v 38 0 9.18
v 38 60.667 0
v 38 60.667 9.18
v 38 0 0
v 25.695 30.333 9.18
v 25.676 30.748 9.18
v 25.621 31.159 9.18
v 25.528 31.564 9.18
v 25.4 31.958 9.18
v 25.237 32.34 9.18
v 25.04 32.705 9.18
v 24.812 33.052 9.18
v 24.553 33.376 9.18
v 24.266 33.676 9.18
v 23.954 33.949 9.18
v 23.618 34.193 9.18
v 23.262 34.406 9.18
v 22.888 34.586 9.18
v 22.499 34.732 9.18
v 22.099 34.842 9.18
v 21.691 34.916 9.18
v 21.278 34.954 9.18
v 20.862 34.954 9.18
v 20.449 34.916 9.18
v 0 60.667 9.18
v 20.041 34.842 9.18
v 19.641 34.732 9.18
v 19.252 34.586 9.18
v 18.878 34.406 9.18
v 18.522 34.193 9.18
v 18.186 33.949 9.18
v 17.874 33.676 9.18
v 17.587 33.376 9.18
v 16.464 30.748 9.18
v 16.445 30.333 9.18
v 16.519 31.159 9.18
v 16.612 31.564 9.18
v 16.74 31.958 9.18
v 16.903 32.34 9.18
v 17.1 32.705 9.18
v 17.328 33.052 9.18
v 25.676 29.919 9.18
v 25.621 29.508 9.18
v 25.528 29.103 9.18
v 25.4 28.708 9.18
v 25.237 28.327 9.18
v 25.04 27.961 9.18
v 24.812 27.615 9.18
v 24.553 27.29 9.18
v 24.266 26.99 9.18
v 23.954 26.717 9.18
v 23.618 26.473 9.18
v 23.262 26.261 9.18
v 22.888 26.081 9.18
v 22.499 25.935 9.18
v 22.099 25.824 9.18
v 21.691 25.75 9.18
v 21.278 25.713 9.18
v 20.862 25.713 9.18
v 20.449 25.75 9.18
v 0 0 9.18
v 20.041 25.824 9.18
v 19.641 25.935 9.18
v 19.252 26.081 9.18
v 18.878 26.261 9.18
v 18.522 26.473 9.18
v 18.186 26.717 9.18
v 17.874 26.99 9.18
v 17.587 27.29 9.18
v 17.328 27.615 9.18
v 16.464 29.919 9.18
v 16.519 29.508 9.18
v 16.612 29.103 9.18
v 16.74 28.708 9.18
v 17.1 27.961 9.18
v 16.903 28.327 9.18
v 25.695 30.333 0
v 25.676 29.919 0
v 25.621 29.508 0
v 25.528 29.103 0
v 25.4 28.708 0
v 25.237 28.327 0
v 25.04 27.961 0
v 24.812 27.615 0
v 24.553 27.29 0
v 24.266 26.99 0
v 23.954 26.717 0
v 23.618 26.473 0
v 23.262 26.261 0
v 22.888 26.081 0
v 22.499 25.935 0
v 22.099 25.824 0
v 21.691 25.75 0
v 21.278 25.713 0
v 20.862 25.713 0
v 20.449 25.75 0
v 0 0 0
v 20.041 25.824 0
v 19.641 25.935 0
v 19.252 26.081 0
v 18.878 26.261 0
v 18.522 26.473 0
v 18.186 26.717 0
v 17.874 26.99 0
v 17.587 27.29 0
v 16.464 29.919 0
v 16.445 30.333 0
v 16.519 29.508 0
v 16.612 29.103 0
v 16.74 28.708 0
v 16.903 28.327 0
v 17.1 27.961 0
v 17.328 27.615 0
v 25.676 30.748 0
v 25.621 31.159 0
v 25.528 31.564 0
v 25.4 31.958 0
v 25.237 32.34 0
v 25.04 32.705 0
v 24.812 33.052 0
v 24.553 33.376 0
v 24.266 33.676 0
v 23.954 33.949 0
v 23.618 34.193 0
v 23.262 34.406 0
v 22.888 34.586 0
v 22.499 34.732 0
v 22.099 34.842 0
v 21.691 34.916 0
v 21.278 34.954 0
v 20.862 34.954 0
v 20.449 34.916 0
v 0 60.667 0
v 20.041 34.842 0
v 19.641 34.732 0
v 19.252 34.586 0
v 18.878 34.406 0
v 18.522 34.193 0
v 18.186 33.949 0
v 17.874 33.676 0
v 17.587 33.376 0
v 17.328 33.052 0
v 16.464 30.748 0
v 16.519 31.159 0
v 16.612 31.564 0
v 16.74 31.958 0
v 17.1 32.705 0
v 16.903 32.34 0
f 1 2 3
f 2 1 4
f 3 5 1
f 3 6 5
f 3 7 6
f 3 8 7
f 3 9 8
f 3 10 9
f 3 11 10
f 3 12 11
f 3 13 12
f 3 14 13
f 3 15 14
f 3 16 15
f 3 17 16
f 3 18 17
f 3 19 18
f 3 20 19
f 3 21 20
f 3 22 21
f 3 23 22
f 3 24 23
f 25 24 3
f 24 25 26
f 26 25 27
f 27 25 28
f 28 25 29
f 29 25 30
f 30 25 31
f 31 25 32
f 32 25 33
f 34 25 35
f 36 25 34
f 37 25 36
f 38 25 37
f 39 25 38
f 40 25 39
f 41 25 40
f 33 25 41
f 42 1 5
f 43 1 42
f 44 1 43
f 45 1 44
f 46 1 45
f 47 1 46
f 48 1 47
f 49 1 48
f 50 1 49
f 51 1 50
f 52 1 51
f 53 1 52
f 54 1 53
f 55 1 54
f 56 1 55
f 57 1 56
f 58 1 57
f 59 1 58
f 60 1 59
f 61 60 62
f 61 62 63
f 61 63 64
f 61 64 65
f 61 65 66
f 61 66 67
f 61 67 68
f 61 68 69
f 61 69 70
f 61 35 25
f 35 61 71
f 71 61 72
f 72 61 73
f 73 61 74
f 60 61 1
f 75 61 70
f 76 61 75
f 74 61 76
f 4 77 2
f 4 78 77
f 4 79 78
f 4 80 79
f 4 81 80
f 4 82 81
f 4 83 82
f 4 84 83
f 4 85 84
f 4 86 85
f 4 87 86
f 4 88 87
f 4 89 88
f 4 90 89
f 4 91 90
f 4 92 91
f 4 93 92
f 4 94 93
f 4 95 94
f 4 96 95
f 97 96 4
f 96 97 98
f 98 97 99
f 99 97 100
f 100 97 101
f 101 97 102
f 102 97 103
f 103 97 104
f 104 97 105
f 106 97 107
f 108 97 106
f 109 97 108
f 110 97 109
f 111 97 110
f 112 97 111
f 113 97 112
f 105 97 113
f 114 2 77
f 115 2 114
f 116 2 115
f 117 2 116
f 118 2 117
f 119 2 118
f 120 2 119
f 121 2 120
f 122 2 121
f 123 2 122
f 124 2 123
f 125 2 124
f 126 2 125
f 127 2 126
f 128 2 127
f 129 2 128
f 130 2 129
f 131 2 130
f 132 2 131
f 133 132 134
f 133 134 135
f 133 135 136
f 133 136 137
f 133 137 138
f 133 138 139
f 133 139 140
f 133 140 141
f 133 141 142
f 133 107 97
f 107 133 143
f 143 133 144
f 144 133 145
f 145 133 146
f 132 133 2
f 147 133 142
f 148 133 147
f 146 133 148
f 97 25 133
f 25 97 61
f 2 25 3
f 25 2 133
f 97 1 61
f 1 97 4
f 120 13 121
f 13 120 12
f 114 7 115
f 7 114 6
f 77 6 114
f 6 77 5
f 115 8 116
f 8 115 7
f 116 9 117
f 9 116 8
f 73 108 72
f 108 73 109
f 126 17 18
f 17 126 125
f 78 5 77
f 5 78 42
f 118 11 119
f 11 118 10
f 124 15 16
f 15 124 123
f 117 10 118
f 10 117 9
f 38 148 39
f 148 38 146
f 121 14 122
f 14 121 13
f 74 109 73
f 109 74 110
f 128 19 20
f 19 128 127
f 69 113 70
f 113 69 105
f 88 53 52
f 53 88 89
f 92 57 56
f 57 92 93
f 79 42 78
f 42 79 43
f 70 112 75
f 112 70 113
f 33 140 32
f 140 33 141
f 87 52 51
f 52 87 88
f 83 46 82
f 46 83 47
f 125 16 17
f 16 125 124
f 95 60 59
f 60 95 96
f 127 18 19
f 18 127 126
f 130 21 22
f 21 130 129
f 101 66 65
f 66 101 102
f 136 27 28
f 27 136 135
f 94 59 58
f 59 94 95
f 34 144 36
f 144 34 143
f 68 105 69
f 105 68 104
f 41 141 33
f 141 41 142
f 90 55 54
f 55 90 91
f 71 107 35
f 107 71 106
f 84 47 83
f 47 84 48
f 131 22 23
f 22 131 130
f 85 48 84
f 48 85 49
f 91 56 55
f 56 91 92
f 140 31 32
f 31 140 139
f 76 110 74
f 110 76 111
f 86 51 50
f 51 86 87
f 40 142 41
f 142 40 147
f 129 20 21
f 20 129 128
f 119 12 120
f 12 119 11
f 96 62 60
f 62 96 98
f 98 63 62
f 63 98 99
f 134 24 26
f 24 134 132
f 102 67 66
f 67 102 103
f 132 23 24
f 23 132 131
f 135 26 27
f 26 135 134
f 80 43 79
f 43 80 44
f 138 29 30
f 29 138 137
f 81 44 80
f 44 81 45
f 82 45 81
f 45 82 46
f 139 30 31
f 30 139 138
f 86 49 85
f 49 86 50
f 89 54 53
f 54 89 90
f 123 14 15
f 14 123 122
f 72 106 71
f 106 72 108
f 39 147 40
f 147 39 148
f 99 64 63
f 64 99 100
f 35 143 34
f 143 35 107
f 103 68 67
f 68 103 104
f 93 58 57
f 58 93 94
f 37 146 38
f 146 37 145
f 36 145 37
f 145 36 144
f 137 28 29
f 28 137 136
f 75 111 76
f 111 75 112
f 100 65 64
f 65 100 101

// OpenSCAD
//everything is in units of millimeters
resolution = 0.35;

//variables to keep in-sync with the other scad file
mainShellThickness = 5 * resolution;
mainDepth = 57;
mainWidth = 91;
mainHeight = 37 + mainShellThickness;
caseCornerRadius = 2.5;
cylinderFragments = 70;

//keep in-sync with the main case file
mountingHoleRadius = 4.45;
mountingPillarRadius = mountingHoleRadius + 1.5;
mountingHoleHeight = 8.68;
mountingPillarHeight = mountingHoleHeight + 0.5;

plateDepth = mainDepth / 1.5;
plateWidth = mainWidth / 1.5;
plateThickness = mountingPillarHeight;
plateHoleRadius = mountingHoleRadius + resolution / 2;
plateMountingHoleX = plateDepth - plateThickness - mountingHoleRadius - 3.3; //keep aligned with mountingHoleX variable

difference() {
    cube([plateDepth, plateWidth, plateThickness]);
    
    //bottom mounting hole
    translate([plateMountingHoleX, plateWidth/2, 0]) {
      cylinder(plateThickness, plateHoleRadius, plateHoleRadius, $fn=cylinderFragments);
    };
};
